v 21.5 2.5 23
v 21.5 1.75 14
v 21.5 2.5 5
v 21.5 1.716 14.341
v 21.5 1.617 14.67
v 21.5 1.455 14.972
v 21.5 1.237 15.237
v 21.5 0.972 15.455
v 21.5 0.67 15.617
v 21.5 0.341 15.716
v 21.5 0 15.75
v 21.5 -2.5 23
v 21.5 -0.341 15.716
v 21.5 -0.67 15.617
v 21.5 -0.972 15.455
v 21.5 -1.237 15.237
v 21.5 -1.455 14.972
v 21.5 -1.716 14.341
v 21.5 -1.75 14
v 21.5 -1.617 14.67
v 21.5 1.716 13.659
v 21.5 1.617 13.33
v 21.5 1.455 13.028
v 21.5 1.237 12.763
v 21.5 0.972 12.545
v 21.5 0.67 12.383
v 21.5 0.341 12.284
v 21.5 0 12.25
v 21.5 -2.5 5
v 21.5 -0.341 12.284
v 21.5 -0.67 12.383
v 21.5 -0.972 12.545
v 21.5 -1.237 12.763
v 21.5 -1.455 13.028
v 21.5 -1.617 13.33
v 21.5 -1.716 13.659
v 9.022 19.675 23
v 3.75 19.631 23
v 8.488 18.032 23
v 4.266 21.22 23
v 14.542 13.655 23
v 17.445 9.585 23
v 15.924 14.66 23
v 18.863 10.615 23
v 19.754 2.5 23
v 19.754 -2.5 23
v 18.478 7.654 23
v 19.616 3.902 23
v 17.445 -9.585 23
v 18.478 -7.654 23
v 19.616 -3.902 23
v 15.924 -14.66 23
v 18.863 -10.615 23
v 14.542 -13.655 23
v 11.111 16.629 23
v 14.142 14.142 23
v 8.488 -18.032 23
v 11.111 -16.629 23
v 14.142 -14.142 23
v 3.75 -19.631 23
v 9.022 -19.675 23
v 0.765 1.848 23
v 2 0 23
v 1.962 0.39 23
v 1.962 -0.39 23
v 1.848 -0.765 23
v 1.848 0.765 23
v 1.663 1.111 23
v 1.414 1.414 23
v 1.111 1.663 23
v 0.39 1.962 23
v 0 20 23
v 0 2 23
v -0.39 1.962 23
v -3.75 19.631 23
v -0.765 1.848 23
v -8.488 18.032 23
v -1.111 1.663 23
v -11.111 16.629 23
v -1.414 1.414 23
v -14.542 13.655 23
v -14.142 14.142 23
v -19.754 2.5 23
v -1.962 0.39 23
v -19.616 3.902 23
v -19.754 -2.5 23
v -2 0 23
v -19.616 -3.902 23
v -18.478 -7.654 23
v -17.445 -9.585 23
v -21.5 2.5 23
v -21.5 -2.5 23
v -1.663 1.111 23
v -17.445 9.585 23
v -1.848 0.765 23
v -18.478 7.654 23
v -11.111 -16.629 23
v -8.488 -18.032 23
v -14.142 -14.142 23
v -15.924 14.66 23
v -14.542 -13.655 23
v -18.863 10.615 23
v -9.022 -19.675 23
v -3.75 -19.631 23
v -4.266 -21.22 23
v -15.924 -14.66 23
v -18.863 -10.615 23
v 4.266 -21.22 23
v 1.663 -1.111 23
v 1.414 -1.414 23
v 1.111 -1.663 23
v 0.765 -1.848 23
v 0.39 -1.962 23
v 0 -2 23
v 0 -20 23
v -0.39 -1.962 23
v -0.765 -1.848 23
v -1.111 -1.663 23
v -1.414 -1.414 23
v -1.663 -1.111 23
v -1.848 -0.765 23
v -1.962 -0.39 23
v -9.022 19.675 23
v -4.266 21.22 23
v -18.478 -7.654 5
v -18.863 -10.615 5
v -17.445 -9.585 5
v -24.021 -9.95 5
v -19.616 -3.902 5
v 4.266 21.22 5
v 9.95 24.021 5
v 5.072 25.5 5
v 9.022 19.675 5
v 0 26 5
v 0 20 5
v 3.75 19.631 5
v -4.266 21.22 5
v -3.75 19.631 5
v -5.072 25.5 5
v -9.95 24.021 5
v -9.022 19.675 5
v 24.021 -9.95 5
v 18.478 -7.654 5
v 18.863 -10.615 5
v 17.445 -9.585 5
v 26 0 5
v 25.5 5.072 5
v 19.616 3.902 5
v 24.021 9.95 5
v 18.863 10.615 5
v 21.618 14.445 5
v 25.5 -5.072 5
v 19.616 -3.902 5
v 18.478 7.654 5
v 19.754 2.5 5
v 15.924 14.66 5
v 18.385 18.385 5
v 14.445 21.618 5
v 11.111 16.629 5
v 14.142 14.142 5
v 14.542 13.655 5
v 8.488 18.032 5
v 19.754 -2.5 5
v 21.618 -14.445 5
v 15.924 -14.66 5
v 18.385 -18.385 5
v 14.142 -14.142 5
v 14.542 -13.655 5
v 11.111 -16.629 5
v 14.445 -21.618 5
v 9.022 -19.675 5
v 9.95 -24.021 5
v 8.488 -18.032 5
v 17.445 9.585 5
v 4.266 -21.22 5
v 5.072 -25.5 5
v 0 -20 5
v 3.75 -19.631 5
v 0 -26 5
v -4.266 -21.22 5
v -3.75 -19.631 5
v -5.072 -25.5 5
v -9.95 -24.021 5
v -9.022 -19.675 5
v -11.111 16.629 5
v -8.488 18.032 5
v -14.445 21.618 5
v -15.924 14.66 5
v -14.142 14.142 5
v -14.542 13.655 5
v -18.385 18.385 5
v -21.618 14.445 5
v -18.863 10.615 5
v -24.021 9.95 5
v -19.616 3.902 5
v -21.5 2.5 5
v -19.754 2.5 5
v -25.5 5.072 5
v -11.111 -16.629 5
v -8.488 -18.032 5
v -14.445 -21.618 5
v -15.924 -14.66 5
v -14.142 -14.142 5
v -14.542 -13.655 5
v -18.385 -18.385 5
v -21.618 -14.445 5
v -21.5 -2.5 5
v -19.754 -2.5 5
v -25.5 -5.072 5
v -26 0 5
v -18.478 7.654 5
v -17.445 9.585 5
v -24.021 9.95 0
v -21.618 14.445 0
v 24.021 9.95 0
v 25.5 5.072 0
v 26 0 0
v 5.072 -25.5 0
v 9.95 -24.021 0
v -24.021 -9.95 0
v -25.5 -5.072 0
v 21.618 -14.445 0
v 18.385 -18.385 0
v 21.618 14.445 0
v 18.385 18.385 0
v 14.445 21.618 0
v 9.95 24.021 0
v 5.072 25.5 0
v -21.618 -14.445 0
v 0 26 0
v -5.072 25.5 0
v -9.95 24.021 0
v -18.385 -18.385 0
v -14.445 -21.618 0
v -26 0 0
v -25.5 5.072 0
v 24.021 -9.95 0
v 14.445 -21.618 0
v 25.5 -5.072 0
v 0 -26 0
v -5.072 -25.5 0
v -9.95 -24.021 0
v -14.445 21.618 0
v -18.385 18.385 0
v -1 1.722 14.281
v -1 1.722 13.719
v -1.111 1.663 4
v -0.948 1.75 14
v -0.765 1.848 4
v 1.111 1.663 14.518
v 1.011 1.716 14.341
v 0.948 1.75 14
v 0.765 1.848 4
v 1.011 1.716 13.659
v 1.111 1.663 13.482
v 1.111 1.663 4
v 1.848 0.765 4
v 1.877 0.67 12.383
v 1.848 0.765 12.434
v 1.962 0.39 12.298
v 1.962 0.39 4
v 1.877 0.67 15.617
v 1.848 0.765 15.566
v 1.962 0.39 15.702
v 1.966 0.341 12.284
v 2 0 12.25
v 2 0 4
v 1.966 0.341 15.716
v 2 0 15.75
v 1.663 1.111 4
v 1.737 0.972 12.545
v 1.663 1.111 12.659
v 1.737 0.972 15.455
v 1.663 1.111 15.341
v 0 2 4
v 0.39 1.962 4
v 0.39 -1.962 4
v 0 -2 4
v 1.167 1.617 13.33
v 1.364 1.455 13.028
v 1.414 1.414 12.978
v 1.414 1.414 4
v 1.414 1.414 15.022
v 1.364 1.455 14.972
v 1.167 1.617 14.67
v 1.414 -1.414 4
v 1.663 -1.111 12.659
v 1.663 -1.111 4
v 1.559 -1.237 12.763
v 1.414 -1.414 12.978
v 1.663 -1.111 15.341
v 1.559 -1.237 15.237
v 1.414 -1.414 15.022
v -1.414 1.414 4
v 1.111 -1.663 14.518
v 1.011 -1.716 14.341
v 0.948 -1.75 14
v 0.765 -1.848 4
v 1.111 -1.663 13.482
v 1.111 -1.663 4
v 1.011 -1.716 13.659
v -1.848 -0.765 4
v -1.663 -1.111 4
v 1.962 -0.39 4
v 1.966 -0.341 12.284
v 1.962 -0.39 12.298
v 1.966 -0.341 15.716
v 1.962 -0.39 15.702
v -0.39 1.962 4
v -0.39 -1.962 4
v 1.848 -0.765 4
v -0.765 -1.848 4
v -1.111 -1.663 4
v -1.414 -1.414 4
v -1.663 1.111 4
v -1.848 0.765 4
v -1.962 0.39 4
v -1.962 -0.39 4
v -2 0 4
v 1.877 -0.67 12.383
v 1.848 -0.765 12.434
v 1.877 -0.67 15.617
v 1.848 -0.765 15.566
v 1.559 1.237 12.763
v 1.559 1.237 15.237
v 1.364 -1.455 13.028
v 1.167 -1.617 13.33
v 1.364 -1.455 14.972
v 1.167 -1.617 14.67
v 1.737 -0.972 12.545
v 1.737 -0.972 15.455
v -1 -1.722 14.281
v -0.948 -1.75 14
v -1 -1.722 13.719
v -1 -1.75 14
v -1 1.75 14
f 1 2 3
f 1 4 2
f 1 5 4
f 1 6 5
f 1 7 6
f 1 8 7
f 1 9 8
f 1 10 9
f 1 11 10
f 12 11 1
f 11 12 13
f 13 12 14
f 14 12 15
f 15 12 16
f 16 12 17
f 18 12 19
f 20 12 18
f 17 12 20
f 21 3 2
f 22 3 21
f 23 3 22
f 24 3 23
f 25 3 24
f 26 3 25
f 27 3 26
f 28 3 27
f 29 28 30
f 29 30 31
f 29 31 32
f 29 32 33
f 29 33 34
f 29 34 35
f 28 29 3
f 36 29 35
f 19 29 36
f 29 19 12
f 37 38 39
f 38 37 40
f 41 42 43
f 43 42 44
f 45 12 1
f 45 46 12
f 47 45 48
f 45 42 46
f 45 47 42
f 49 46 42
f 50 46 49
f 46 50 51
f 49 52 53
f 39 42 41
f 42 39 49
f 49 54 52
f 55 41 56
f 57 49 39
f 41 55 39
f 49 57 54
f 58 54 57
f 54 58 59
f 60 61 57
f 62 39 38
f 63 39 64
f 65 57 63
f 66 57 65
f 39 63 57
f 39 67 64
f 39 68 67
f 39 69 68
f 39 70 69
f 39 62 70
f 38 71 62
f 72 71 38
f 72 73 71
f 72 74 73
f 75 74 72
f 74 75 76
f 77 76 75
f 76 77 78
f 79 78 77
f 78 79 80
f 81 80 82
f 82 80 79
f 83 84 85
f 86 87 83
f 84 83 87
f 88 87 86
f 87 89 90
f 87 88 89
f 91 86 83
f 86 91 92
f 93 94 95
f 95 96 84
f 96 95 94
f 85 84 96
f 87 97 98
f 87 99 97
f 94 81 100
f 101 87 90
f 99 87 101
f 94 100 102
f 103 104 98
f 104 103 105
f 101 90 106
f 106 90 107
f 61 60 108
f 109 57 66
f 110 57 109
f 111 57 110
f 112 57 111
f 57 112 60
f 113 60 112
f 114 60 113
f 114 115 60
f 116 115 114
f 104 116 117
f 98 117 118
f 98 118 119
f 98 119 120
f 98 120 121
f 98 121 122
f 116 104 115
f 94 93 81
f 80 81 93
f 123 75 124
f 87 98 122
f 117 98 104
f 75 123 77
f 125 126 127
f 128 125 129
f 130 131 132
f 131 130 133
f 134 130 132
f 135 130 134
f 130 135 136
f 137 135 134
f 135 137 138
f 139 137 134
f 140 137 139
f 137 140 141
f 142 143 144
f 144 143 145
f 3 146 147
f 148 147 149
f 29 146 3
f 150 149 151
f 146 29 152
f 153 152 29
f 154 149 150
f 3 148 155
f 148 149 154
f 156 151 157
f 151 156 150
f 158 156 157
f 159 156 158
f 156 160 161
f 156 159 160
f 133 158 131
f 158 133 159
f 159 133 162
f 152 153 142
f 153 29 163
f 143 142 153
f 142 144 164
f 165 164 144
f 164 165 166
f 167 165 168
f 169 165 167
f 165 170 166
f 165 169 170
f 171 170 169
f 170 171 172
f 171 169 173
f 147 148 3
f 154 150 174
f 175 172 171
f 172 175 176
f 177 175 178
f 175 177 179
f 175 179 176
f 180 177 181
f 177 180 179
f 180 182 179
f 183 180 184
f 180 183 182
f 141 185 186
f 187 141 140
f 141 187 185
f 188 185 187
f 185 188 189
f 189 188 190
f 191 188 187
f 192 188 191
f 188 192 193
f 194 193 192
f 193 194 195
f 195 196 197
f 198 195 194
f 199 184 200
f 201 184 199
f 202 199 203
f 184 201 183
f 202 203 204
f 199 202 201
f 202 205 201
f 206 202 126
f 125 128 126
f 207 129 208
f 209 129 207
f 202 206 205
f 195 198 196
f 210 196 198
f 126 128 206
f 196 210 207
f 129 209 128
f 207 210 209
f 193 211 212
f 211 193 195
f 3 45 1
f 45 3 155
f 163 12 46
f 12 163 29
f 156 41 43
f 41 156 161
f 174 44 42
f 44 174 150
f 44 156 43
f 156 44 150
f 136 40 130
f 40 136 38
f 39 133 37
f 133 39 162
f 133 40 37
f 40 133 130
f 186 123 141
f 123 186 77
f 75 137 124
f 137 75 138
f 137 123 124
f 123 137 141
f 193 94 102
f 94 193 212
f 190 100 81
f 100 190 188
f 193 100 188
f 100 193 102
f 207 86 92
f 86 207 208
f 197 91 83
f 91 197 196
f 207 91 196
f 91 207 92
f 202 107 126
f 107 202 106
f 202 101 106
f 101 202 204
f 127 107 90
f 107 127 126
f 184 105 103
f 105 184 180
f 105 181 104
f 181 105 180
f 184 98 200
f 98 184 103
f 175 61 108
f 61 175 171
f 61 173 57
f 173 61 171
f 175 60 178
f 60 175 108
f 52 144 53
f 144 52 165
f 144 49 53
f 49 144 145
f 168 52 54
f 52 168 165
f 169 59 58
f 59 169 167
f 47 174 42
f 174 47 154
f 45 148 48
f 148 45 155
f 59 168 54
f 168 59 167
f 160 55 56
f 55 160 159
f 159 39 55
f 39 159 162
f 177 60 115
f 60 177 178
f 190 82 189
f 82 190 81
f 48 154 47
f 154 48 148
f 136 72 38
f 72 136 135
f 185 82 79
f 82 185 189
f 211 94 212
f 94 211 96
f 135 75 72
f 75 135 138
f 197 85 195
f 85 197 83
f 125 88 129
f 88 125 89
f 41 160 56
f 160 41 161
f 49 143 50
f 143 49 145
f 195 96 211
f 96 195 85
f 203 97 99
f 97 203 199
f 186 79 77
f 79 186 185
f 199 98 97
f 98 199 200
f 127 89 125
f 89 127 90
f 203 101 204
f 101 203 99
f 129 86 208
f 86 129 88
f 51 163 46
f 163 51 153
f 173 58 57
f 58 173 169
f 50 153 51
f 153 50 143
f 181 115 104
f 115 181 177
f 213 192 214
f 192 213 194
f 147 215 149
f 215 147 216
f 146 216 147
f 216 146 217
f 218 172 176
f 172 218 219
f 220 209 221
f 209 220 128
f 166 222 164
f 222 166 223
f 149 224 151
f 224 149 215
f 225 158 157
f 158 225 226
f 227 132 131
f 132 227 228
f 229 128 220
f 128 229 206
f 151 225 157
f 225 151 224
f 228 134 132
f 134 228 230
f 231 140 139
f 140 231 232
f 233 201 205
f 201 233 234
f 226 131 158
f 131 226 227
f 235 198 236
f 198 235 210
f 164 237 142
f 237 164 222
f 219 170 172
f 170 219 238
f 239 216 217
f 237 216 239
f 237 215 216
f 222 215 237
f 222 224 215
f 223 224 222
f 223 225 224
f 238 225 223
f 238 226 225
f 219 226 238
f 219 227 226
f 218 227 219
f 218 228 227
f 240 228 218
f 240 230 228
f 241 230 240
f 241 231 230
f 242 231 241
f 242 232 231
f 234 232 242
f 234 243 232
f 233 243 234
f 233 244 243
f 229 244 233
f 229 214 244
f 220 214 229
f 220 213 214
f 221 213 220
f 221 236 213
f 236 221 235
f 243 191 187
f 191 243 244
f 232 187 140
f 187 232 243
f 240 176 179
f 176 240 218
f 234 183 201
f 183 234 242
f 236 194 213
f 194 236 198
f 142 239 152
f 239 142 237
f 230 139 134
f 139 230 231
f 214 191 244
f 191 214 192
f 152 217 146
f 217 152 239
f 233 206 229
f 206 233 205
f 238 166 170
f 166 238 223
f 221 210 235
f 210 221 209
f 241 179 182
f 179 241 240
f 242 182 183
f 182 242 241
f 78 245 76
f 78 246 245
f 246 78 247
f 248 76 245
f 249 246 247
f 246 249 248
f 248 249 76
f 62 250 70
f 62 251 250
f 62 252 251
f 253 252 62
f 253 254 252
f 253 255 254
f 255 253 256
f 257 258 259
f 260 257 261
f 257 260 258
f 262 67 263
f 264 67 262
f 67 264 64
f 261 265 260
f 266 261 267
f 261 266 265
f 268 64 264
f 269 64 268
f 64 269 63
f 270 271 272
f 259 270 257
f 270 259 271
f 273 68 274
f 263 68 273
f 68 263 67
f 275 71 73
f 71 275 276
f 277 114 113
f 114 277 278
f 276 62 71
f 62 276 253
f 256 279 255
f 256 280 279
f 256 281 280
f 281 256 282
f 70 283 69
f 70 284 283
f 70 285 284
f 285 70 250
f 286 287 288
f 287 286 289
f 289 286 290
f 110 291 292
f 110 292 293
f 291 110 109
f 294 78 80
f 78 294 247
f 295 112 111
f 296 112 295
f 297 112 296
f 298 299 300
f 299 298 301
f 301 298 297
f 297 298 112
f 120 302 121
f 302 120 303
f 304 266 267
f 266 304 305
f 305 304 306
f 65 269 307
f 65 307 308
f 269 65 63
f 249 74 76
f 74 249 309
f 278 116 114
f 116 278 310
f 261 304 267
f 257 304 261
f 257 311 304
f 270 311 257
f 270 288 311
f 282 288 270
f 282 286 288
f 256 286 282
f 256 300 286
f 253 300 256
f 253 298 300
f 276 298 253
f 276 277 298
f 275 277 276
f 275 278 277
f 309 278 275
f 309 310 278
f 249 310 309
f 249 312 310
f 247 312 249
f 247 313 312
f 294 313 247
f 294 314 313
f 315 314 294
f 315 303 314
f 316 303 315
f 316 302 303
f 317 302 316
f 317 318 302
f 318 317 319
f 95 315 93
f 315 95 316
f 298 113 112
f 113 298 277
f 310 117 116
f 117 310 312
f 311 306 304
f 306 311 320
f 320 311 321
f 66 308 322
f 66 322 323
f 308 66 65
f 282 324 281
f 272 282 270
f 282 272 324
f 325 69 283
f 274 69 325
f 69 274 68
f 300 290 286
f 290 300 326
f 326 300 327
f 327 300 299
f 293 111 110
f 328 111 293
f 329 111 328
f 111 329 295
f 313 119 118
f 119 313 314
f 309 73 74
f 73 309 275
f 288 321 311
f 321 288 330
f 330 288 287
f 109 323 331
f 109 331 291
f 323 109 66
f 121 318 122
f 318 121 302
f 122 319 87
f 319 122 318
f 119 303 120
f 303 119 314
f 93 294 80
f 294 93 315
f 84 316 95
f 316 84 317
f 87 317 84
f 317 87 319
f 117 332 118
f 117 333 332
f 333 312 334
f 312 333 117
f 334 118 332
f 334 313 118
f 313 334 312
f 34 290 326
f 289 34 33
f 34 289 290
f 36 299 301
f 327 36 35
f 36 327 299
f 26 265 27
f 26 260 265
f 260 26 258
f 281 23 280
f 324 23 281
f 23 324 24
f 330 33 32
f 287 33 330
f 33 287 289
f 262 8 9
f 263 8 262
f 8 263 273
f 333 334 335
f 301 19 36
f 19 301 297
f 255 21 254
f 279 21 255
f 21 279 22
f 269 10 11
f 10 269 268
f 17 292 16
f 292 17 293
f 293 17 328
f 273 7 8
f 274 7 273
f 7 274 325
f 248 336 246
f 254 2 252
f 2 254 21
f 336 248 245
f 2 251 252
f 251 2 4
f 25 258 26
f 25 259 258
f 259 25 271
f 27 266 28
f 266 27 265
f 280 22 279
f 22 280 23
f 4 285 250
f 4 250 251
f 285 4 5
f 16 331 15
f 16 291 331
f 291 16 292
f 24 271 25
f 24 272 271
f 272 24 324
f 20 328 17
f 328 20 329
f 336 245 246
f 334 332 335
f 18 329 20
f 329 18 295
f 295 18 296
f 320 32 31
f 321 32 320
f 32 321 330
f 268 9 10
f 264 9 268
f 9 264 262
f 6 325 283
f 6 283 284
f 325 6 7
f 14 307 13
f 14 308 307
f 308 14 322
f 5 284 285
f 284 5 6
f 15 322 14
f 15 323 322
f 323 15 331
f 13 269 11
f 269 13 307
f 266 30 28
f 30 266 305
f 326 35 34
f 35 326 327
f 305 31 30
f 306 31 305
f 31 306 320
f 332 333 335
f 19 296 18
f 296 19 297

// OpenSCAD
$fn = 32;

// ----------------------------------------------------------------------
// Control knob: skirt knob with grip ribs
// ----------------------------------------------------------------------

// --- parameters (mm) ---
skirt_d = 52;             // skirt diameter
skirt_t = 5;              // skirt thickness
rib_w = 5;                // grip rib width
rib_out = 2.5;            // grip rib radial protrusion
n_ribs = 10;              // number of grip ribs
knob_d = 40;              // knob body diameter
knob_h = 18;              // knob body height
bore_d = 4;               // shaft bore diameter
set_d = 3.5;              // set screw bore diameter
fit_tol = 0.1;            // tolerance for press fits, mm
free_tol = 0.3;           // tolerance for clearance fits, mm

rib_step = 360 / n_ribs;  // rib angular step
total_h = skirt_t + knob_h;  // overall height

difference() {
  union() {
    translate([0, 0, skirt_t]) cylinder(h = knob_h, d = knob_d);
    cylinder(h = skirt_t, d = skirt_d);
    for (i = [0 : n_ribs - 1])
      rotate([0, 0, i * rib_step])
        translate([knob_d / 2 - 1, -rib_w / 2, skirt_t])
          cube([rib_out, rib_w, knob_h]);
  }
  translate([0, 0, skirt_t - 1]) cylinder(h = knob_h + 2, d = bore_d);
  translate([-1, 0, skirt_t + knob_h / 2]) rotate([0, 90, 0])
    cylinder(h = knob_d / 2 + bore_d / 2 + 2, d = set_d);
}
